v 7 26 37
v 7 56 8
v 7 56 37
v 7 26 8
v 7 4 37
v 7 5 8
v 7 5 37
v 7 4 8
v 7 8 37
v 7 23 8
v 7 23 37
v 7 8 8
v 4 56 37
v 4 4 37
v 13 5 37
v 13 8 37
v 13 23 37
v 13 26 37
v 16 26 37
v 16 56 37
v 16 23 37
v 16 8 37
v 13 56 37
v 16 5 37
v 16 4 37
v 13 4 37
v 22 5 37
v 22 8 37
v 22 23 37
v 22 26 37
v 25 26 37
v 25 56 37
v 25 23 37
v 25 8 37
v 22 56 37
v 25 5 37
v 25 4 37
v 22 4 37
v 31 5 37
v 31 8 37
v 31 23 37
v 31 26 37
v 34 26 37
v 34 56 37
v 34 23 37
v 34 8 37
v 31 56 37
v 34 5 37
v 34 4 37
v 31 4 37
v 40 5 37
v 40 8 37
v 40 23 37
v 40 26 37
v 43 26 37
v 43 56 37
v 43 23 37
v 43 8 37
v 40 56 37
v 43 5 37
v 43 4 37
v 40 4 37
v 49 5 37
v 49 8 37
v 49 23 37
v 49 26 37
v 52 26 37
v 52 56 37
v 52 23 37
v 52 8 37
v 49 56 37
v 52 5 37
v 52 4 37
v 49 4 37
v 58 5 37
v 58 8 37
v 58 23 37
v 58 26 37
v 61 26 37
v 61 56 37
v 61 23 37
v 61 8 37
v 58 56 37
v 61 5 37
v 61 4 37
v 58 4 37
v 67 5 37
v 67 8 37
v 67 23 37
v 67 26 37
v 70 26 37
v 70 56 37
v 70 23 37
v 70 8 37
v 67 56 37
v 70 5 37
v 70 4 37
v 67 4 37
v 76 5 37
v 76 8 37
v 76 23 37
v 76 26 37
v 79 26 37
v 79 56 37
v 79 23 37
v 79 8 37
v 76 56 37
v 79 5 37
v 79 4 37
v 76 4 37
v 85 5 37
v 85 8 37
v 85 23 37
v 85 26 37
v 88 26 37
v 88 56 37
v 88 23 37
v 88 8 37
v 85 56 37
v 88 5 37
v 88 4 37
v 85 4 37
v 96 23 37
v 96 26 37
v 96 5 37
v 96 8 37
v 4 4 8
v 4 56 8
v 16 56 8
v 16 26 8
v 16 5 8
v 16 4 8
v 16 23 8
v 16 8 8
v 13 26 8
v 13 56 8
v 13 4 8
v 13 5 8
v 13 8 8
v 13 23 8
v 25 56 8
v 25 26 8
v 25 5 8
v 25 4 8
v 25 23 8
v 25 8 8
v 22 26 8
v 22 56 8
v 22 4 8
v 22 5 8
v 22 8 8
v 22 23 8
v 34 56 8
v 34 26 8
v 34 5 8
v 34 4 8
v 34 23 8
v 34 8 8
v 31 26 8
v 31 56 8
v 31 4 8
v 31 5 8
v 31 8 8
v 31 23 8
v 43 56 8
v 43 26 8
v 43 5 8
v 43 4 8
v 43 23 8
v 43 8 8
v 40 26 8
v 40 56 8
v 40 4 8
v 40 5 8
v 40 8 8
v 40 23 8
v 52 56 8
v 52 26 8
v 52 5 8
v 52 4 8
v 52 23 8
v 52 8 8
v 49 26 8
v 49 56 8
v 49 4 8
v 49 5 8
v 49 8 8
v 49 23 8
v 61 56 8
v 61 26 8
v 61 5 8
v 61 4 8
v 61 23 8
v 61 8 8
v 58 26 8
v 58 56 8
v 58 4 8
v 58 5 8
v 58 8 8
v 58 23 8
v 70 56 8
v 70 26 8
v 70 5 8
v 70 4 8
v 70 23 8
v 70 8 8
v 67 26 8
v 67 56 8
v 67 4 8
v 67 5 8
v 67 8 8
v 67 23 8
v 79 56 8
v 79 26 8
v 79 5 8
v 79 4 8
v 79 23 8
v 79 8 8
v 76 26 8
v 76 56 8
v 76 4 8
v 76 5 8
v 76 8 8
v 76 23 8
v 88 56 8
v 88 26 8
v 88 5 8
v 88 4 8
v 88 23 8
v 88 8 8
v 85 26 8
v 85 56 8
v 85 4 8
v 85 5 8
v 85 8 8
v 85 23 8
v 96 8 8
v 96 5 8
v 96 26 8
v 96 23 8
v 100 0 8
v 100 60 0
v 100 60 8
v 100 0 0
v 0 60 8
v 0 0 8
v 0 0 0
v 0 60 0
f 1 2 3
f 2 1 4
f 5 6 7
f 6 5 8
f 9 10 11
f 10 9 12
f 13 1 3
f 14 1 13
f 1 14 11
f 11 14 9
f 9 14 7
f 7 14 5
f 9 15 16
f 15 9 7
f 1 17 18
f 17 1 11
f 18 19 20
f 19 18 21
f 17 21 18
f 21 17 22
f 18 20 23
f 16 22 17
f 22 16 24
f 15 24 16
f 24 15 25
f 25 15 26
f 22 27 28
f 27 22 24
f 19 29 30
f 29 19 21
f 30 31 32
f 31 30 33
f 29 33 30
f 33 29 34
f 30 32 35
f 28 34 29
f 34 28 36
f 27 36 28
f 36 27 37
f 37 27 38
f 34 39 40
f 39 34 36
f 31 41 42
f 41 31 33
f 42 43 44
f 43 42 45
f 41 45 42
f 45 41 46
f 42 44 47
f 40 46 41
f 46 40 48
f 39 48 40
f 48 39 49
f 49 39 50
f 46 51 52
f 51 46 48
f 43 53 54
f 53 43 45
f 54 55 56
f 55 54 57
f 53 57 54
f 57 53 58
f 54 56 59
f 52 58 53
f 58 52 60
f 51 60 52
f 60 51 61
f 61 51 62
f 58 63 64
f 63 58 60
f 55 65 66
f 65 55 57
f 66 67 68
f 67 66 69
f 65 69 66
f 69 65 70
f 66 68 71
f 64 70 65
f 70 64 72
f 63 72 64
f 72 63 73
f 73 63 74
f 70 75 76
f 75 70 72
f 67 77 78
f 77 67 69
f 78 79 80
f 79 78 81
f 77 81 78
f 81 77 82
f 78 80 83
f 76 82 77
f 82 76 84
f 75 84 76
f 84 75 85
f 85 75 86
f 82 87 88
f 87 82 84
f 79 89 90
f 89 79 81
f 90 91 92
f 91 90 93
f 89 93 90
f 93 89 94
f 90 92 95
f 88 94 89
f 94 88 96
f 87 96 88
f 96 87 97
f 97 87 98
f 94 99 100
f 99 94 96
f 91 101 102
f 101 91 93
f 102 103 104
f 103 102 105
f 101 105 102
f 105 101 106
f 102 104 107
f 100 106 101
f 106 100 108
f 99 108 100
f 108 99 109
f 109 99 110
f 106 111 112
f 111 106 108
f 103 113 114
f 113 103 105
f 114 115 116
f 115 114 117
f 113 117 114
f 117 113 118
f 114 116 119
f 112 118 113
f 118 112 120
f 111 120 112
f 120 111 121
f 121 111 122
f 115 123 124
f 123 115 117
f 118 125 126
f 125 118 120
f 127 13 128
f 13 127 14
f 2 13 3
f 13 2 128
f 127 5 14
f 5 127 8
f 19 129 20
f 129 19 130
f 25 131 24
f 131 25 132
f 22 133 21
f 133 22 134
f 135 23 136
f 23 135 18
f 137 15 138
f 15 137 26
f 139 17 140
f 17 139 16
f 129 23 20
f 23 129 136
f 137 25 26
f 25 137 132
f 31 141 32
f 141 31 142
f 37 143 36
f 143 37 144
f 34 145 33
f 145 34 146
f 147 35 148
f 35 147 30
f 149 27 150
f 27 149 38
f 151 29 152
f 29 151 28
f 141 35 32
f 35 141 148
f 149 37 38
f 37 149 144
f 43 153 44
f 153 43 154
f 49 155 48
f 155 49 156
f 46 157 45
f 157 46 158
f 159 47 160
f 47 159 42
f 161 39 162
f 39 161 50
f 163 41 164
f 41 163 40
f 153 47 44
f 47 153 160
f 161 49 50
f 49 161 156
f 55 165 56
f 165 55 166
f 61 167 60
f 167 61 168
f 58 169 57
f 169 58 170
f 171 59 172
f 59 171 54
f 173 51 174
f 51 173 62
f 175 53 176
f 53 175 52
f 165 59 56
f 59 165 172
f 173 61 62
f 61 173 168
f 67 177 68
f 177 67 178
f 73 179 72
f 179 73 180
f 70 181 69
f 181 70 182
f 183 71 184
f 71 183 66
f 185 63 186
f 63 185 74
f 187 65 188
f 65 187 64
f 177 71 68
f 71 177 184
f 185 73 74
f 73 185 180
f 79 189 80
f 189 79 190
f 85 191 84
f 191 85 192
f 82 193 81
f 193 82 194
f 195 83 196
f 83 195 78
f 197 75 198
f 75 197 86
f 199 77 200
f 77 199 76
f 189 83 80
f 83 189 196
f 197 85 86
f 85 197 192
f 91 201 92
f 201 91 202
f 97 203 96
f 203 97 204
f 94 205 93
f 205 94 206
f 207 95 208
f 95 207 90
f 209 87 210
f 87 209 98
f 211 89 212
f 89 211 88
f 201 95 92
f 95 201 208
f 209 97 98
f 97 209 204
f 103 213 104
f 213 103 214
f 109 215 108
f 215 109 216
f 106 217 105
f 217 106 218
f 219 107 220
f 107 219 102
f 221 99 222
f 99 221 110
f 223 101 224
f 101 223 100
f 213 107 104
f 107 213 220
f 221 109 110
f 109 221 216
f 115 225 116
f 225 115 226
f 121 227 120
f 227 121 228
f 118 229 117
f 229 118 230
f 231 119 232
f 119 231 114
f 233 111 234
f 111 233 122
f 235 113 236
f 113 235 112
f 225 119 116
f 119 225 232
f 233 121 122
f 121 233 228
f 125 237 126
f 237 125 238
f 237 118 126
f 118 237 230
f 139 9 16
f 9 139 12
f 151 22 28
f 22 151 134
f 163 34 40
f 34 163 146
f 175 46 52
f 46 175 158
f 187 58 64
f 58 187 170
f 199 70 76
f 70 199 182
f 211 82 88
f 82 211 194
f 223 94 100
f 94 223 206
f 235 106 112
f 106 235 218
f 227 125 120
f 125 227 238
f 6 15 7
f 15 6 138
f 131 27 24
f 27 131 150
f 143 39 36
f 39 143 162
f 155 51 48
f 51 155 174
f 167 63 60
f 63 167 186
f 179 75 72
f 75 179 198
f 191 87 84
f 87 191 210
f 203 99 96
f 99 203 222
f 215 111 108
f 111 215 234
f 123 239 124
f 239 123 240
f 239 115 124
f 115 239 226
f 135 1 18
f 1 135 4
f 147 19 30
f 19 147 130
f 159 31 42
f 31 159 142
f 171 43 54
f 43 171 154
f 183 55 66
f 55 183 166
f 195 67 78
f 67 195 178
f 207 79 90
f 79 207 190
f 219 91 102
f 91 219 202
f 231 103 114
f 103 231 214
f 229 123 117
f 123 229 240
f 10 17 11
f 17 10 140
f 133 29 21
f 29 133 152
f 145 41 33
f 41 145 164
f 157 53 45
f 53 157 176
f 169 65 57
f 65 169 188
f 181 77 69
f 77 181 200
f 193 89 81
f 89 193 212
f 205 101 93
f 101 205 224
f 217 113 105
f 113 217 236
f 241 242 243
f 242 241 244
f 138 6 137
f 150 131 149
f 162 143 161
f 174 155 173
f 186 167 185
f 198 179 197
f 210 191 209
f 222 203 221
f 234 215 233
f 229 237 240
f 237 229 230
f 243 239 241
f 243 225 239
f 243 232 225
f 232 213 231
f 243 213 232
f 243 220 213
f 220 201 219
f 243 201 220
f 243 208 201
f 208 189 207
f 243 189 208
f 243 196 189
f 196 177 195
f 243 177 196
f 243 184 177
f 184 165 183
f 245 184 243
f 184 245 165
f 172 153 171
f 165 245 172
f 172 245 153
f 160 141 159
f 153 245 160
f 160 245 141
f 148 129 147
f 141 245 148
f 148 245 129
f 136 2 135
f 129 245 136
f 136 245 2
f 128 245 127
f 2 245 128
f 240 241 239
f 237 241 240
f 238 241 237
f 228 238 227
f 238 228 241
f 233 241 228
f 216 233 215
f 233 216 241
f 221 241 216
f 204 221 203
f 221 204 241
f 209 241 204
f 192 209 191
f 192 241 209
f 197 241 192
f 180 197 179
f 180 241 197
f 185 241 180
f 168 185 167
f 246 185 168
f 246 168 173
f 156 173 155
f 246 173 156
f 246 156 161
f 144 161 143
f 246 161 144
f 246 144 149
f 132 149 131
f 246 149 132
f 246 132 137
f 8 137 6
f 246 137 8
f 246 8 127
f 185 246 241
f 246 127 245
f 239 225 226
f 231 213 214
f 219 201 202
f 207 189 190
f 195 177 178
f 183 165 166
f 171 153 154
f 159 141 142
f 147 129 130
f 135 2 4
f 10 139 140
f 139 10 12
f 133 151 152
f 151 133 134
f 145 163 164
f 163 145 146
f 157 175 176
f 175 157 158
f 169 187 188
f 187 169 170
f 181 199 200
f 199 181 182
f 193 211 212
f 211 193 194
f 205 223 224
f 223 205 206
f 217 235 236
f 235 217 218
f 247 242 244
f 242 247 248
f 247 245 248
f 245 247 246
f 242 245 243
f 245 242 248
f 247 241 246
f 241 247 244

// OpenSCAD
$fn = 32;

// ----------------------------------------------------------------------
// Heatsink: cross fin block
// ----------------------------------------------------------------------

// --- parameters (mm) ---
base_l = 100;             // base length, X
base_w = 60;              // base width, Y
base_t = 8;               // base plate thickness
fin_h = 30;               // fin height above the base
fin_t = 3;                // fin thickness
edge = 4;                 // margin from the base ends
pitch = 9;                // fin pitch
rib_pitch = 18;           // cross rib pitch

n_fins = floor((base_l - 2 * edge - fin_t) / pitch) + 1;  // fin count
total_h = base_t + fin_h - 1;  // overall height
n_ribs = floor((base_w - 2 * edge) / rib_pitch);  // rib count

union() {
  cube([base_l, base_w, base_t]);
  for (i = [0 : n_fins - 1])
    translate([edge + i * pitch, edge, base_t - 1])
      cube([fin_t, base_w - 2 * edge, fin_h]);
  for (i = [0 : n_ribs - 1])
    translate([edge, edge + 1 + i * rib_pitch, base_t - 1])
      cube([base_l - 2 * edge, fin_t, fin_h]);
}
